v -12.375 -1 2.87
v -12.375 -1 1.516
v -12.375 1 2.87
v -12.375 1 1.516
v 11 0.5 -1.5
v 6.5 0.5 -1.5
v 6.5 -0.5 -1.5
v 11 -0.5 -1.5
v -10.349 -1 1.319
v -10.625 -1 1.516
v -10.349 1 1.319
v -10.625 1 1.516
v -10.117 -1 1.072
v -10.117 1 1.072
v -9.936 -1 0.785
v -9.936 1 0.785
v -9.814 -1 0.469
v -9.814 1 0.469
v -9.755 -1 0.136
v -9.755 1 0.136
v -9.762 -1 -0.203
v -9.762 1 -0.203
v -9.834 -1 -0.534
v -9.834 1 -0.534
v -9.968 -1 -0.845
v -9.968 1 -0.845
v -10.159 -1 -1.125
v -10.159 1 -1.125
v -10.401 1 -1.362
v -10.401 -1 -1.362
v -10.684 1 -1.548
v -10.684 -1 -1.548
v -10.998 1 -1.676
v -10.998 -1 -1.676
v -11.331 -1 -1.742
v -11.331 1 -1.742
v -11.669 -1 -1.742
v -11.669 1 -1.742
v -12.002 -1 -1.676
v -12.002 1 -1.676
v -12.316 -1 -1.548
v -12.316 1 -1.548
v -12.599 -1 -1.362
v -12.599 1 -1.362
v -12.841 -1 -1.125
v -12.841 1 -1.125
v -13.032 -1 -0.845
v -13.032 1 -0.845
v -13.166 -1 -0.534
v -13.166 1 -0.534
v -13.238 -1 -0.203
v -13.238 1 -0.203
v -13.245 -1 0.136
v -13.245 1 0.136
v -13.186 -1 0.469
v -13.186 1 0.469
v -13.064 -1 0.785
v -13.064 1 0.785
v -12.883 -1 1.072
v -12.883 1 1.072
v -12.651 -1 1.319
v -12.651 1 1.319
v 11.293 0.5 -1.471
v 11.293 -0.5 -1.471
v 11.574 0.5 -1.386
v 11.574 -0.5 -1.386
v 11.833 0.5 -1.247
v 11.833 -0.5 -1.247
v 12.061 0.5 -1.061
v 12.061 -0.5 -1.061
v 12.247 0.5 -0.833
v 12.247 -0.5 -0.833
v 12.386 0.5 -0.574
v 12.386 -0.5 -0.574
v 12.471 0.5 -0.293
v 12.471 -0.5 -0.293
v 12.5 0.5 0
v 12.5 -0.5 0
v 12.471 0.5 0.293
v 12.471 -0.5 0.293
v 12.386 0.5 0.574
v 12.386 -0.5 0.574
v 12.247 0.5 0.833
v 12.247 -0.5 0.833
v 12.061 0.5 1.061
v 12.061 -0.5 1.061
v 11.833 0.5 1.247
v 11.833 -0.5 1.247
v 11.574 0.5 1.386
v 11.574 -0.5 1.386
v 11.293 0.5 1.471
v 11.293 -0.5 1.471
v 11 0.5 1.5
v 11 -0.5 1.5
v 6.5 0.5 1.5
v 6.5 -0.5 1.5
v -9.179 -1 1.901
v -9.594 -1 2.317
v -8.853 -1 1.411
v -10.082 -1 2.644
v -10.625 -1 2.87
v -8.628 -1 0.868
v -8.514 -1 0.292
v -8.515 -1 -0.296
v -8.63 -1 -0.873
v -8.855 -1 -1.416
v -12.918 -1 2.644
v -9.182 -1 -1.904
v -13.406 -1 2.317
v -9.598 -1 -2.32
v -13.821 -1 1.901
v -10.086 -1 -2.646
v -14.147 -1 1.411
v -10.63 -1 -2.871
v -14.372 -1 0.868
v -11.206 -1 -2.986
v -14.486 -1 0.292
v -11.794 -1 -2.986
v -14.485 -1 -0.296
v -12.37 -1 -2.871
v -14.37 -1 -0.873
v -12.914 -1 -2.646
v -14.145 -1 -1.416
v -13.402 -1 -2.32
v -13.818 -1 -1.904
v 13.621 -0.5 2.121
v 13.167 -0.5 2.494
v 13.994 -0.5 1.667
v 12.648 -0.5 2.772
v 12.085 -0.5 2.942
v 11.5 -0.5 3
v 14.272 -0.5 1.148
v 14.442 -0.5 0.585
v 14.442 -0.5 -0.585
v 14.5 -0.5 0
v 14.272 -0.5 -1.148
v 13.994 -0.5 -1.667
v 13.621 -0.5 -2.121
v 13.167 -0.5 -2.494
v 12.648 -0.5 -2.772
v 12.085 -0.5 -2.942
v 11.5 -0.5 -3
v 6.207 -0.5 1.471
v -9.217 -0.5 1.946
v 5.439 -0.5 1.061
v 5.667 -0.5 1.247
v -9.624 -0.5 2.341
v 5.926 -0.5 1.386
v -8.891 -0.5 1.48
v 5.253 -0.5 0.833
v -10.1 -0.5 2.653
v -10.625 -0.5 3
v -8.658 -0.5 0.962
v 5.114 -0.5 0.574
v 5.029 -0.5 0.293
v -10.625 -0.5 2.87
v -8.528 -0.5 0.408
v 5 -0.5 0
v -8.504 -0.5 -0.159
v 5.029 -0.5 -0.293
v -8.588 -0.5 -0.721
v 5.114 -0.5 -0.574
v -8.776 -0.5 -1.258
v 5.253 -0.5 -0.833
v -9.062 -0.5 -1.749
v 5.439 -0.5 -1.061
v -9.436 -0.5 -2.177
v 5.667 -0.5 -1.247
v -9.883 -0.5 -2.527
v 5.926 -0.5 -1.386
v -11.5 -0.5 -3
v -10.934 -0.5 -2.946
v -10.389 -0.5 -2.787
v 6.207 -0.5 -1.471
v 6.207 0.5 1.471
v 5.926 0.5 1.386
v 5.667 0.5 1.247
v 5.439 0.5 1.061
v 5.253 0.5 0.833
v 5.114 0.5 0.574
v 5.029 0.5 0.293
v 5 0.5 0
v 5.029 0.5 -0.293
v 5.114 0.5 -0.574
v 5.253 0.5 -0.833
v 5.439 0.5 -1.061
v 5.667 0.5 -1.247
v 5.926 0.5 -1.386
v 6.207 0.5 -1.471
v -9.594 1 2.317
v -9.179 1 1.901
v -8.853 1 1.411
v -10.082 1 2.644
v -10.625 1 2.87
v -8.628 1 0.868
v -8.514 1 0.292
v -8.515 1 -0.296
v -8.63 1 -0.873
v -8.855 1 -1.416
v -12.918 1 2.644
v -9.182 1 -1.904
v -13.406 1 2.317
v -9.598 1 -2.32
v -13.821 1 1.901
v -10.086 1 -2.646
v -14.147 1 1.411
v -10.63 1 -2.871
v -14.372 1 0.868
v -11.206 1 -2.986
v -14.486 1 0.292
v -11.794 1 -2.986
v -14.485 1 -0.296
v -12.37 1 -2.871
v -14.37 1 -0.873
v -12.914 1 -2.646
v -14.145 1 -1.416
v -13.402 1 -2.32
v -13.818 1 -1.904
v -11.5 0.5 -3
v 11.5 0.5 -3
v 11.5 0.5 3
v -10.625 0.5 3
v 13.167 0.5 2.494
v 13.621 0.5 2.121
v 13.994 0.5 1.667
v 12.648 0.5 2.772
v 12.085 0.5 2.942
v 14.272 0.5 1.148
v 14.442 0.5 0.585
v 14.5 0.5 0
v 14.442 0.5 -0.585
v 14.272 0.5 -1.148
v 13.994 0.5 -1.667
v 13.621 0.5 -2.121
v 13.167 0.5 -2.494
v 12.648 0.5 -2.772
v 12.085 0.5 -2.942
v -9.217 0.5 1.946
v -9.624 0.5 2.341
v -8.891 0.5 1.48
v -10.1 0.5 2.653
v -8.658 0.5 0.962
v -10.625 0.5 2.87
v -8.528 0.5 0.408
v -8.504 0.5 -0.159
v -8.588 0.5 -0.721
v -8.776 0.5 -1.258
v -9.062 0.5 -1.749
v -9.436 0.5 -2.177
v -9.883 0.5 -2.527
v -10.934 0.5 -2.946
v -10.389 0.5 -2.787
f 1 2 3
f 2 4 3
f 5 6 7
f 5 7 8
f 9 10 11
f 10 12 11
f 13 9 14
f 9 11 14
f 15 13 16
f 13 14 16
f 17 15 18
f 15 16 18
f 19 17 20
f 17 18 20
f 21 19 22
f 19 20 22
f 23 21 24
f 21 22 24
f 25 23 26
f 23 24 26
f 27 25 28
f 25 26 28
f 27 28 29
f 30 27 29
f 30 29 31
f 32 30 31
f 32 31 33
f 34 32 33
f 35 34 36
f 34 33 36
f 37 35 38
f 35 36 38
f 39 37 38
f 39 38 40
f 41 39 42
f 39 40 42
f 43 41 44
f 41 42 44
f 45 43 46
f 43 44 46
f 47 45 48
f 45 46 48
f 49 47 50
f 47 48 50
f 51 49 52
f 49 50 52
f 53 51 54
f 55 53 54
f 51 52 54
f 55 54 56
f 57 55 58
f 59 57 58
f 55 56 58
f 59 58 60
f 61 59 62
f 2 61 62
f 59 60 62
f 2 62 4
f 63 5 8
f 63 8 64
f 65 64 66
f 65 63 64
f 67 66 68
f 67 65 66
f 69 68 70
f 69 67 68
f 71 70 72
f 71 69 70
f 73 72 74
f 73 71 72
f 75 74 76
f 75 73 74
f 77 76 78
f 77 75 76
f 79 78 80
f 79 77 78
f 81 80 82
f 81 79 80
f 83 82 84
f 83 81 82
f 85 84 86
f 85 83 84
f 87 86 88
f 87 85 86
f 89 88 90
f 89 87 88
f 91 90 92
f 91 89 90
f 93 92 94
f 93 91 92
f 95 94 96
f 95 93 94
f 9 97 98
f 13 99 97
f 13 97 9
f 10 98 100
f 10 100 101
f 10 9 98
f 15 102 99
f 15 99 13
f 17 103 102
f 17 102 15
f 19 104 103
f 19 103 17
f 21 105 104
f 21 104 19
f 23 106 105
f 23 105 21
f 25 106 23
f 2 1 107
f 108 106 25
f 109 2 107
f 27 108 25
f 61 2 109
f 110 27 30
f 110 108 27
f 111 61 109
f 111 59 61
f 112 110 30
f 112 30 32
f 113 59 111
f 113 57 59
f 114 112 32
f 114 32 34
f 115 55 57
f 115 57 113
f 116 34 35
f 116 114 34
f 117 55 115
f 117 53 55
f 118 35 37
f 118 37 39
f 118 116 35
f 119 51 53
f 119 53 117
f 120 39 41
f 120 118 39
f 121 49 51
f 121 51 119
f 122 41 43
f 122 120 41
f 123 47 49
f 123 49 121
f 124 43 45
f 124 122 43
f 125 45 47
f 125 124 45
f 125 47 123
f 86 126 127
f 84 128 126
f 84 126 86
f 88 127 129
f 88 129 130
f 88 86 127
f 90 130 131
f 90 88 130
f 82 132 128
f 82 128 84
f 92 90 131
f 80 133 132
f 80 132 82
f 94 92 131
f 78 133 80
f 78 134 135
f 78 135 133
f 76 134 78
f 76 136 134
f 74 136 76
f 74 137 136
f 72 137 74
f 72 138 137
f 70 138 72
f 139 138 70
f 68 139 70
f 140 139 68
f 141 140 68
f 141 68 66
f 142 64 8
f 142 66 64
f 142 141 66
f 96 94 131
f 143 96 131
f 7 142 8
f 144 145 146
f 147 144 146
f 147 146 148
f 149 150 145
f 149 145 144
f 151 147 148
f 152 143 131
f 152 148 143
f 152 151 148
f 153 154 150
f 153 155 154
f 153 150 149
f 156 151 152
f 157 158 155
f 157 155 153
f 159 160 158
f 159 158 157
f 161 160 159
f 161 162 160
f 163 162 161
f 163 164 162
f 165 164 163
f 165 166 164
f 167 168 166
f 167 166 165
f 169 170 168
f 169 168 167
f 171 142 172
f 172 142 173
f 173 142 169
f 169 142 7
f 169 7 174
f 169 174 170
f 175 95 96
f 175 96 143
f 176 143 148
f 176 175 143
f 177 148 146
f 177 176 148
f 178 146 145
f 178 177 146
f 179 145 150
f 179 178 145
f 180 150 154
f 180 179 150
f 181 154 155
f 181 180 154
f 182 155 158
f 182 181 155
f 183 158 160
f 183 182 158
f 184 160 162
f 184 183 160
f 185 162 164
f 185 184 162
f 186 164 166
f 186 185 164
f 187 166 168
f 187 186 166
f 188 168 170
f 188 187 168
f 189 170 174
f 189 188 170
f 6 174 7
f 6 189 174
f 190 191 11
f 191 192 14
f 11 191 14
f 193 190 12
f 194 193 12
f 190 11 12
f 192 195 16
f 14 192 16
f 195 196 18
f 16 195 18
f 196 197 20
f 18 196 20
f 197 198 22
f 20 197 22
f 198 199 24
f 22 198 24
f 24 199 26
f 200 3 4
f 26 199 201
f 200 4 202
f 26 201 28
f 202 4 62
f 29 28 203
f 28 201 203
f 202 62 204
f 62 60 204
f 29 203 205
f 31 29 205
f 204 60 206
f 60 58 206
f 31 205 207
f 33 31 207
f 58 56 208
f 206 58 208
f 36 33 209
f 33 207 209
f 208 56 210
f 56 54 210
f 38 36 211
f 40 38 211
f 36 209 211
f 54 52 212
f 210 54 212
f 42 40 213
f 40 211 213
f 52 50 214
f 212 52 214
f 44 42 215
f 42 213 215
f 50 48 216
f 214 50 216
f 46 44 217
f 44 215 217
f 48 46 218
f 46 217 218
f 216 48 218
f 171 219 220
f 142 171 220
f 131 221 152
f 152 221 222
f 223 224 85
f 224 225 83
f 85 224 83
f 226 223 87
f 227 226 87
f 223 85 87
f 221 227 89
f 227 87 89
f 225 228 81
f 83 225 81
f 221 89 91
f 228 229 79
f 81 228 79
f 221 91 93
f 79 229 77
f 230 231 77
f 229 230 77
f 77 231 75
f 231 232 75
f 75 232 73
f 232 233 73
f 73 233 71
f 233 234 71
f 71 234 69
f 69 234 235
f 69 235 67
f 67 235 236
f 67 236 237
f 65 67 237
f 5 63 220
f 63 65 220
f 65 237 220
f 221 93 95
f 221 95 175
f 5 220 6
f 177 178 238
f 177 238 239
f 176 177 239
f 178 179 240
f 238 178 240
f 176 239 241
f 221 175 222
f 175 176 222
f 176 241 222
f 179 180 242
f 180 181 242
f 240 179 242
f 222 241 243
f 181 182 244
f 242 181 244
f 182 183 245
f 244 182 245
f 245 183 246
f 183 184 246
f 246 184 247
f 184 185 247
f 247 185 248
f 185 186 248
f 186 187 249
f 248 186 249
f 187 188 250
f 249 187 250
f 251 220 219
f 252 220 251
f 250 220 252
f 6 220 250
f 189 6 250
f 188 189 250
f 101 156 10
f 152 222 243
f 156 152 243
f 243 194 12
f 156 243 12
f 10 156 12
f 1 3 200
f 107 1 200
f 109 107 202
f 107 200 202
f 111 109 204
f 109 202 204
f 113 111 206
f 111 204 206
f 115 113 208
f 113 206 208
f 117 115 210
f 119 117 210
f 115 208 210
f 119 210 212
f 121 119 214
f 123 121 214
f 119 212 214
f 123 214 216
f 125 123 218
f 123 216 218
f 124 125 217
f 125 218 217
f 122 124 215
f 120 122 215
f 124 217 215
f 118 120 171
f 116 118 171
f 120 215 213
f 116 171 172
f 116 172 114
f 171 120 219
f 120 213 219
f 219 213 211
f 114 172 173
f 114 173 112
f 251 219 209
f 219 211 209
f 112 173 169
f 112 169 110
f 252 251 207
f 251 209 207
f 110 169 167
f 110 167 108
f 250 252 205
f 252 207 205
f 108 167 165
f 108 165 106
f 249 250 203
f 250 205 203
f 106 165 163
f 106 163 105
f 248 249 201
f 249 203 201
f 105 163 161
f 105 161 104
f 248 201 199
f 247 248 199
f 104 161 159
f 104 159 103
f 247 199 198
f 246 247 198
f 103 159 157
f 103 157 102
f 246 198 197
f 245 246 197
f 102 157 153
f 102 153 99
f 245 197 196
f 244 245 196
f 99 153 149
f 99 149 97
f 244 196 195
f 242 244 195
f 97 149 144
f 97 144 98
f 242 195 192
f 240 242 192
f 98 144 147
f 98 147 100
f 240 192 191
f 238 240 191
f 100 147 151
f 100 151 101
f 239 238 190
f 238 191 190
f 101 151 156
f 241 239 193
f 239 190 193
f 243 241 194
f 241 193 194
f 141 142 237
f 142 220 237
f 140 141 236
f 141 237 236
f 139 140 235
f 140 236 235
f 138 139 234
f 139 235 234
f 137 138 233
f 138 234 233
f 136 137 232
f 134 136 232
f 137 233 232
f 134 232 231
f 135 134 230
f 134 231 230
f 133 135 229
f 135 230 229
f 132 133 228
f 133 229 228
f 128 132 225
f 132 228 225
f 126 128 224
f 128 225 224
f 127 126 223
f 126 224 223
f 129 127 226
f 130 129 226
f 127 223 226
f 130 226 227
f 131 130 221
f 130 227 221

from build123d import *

# Parameters (mm, degrees)
SCHIZZO1_R                    = 1.75
ESTRUSIONE_ESTRUSIONE1_DEPTH  = 0.5
TAGLIO_ESTRUSIONE2_DEPTH      = 15.81553239
TAGLIO_ESTRUSIONE2_DEPTH_BACK = 15.81553239
ESTRUSIONE_ESTRUSIONE2_DEPTH  = 1


with BuildPart() as part:
    # Schizzo1 → Estrusione-Estrusione1 (new, symmetric)
    with BuildSketch(Plane(origin=(0, 0, 0), x_dir=(1, 0, 0), z_dir=(0, 1, 0))):
        with BuildLine():
            Line((-11.5, 3), (11.5, 3))
            ThreePointArc((11.5, 3), (14.5, 0), (11.5, -3))
            Line((11.5, -3), (-11.5, -3))
            ThreePointArc((-11.5, -3), (-14.5, 0), (-11.5, 3))
        make_face()
        with Locations(Location((-11.5, 0, 0), (0, 0, 270))):
            Circle(SCHIZZO1_R, mode=Mode.SUBTRACT)
        with BuildLine():
            Line((11, -1.5), (6.5, -1.5))
            ThreePointArc((6.5, -1.5), (5, 0), (6.5, 1.5))
            Line((6.5, 1.5), (11, 1.5))
            ThreePointArc((11, 1.5), (12.5, 0), (11, -1.5))
        make_face(mode=Mode.SUBTRACT)
    extrude(amount=ESTRUSIONE_ESTRUSIONE1_DEPTH, both=True)

    # Schizzo2 → Taglio-Estrusione2 (cut, two sides: drawn at the far end of the back side and taken through both)
    with BuildSketch(Plane(origin=(0, 0, 0), x_dir=(1, 0, 0), z_dir=(0, 1, 0)).offset(-TAGLIO_ESTRUSIONE2_DEPTH_BACK)):
        with BuildLine():
            Line((-10.625, -1.515544457), (-10.625, -3))
            Line((-10.625, -3), (-11.5, -3))
            ThreePointArc((-11.5, -3), (-11.942334595, -2.967210829), (-12.375, -2.869560071))
            Line((-12.375, -2.869560071), (-12.375, -1.515544457))
            ThreePointArc((-12.375, -1.515544457), (-11.5, -1.75), (-10.625, -1.515544457))
        make_face()
    extrude(amount=TAGLIO_ESTRUSIONE2_DEPTH + TAGLIO_ESTRUSIONE2_DEPTH_BACK, mode=Mode.SUBTRACT)

    # Schizzo4 → Estrusione-Estrusione2 (add, symmetric)
    with BuildSketch(Plane(origin=(0, 0, 0), x_dir=(1, 0, 0), z_dir=(0, 1, 0))):
        with BuildLine():
            Line((-10.625, -2.869560071), (-10.625, -1.515544457))
            ThreePointArc((-10.625, -1.515544457), (-11.5, 1.75), (-12.375, -1.515544457))
            Line((-12.375, -1.515544457), (-12.375, -2.869560071))
            ThreePointArc((-12.375, -2.869560071), (-11.5, 3), (-10.625, -2.869560071))
        make_face()
    extrude(amount=ESTRUSIONE_ESTRUSIONE2_DEPTH, both=True)


solid = part.part
